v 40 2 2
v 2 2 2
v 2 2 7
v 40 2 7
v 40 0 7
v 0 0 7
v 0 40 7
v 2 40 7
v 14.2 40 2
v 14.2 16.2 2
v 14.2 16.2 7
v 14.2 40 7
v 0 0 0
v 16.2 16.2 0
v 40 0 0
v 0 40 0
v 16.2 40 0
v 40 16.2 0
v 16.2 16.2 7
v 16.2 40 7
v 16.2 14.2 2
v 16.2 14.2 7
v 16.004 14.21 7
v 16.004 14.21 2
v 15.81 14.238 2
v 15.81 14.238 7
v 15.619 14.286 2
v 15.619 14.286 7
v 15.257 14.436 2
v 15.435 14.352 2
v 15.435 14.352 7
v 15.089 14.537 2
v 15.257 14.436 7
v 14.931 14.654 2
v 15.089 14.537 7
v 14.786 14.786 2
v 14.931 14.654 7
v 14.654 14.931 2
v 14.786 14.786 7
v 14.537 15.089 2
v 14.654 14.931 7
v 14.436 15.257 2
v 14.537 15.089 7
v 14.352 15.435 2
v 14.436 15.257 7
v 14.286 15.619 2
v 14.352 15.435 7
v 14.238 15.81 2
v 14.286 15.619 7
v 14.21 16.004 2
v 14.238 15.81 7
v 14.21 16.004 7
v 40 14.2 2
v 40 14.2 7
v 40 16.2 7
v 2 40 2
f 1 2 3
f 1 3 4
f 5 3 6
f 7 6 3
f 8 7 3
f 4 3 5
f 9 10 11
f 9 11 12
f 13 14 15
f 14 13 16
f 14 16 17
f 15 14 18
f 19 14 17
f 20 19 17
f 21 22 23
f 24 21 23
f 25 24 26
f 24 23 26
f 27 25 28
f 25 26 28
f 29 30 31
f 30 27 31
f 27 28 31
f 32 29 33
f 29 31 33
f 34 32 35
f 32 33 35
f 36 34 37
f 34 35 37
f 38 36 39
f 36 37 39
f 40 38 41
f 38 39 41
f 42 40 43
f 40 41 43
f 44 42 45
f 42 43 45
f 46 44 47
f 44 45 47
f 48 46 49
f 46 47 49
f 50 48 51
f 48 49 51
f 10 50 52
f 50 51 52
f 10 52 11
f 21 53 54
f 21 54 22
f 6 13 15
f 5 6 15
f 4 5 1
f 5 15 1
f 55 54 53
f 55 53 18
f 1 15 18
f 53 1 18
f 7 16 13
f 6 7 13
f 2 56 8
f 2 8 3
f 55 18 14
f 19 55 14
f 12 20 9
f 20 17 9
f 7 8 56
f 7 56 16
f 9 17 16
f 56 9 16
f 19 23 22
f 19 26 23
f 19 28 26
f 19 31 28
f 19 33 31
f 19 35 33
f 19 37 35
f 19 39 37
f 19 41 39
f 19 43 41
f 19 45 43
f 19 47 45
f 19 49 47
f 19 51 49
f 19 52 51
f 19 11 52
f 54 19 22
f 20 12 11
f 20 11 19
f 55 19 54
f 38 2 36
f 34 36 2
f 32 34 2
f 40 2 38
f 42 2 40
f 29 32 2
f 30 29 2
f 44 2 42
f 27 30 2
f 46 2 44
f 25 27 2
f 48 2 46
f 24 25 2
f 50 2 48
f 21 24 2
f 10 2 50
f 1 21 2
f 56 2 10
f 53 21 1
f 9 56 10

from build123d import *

# Parameters (mm, degrees)
PAD_DEPTH   = 7
THICKNESS_T = -2


with BuildPart() as part:
    # Sketch → Pad (new body)
    with BuildSketch(Plane.XY):
        Polygon((0, 0), (40, 0), (40, 16.2), (16.2, 16.2), (16.2, 40), (0, 40), align=None)
    extrude(amount=PAD_DEPTH)

    # Thickness
    thickness_openings = [part.faces().sort_by_distance(p)[0] for p in [
        (15.560815, 15.560815, 7),
        (40, 8.1, 3.5),
        (8.1, 40, 3.5),
    ]]
    offset(amount=THICKNESS_T, openings=thickness_openings)


solid = part.part
